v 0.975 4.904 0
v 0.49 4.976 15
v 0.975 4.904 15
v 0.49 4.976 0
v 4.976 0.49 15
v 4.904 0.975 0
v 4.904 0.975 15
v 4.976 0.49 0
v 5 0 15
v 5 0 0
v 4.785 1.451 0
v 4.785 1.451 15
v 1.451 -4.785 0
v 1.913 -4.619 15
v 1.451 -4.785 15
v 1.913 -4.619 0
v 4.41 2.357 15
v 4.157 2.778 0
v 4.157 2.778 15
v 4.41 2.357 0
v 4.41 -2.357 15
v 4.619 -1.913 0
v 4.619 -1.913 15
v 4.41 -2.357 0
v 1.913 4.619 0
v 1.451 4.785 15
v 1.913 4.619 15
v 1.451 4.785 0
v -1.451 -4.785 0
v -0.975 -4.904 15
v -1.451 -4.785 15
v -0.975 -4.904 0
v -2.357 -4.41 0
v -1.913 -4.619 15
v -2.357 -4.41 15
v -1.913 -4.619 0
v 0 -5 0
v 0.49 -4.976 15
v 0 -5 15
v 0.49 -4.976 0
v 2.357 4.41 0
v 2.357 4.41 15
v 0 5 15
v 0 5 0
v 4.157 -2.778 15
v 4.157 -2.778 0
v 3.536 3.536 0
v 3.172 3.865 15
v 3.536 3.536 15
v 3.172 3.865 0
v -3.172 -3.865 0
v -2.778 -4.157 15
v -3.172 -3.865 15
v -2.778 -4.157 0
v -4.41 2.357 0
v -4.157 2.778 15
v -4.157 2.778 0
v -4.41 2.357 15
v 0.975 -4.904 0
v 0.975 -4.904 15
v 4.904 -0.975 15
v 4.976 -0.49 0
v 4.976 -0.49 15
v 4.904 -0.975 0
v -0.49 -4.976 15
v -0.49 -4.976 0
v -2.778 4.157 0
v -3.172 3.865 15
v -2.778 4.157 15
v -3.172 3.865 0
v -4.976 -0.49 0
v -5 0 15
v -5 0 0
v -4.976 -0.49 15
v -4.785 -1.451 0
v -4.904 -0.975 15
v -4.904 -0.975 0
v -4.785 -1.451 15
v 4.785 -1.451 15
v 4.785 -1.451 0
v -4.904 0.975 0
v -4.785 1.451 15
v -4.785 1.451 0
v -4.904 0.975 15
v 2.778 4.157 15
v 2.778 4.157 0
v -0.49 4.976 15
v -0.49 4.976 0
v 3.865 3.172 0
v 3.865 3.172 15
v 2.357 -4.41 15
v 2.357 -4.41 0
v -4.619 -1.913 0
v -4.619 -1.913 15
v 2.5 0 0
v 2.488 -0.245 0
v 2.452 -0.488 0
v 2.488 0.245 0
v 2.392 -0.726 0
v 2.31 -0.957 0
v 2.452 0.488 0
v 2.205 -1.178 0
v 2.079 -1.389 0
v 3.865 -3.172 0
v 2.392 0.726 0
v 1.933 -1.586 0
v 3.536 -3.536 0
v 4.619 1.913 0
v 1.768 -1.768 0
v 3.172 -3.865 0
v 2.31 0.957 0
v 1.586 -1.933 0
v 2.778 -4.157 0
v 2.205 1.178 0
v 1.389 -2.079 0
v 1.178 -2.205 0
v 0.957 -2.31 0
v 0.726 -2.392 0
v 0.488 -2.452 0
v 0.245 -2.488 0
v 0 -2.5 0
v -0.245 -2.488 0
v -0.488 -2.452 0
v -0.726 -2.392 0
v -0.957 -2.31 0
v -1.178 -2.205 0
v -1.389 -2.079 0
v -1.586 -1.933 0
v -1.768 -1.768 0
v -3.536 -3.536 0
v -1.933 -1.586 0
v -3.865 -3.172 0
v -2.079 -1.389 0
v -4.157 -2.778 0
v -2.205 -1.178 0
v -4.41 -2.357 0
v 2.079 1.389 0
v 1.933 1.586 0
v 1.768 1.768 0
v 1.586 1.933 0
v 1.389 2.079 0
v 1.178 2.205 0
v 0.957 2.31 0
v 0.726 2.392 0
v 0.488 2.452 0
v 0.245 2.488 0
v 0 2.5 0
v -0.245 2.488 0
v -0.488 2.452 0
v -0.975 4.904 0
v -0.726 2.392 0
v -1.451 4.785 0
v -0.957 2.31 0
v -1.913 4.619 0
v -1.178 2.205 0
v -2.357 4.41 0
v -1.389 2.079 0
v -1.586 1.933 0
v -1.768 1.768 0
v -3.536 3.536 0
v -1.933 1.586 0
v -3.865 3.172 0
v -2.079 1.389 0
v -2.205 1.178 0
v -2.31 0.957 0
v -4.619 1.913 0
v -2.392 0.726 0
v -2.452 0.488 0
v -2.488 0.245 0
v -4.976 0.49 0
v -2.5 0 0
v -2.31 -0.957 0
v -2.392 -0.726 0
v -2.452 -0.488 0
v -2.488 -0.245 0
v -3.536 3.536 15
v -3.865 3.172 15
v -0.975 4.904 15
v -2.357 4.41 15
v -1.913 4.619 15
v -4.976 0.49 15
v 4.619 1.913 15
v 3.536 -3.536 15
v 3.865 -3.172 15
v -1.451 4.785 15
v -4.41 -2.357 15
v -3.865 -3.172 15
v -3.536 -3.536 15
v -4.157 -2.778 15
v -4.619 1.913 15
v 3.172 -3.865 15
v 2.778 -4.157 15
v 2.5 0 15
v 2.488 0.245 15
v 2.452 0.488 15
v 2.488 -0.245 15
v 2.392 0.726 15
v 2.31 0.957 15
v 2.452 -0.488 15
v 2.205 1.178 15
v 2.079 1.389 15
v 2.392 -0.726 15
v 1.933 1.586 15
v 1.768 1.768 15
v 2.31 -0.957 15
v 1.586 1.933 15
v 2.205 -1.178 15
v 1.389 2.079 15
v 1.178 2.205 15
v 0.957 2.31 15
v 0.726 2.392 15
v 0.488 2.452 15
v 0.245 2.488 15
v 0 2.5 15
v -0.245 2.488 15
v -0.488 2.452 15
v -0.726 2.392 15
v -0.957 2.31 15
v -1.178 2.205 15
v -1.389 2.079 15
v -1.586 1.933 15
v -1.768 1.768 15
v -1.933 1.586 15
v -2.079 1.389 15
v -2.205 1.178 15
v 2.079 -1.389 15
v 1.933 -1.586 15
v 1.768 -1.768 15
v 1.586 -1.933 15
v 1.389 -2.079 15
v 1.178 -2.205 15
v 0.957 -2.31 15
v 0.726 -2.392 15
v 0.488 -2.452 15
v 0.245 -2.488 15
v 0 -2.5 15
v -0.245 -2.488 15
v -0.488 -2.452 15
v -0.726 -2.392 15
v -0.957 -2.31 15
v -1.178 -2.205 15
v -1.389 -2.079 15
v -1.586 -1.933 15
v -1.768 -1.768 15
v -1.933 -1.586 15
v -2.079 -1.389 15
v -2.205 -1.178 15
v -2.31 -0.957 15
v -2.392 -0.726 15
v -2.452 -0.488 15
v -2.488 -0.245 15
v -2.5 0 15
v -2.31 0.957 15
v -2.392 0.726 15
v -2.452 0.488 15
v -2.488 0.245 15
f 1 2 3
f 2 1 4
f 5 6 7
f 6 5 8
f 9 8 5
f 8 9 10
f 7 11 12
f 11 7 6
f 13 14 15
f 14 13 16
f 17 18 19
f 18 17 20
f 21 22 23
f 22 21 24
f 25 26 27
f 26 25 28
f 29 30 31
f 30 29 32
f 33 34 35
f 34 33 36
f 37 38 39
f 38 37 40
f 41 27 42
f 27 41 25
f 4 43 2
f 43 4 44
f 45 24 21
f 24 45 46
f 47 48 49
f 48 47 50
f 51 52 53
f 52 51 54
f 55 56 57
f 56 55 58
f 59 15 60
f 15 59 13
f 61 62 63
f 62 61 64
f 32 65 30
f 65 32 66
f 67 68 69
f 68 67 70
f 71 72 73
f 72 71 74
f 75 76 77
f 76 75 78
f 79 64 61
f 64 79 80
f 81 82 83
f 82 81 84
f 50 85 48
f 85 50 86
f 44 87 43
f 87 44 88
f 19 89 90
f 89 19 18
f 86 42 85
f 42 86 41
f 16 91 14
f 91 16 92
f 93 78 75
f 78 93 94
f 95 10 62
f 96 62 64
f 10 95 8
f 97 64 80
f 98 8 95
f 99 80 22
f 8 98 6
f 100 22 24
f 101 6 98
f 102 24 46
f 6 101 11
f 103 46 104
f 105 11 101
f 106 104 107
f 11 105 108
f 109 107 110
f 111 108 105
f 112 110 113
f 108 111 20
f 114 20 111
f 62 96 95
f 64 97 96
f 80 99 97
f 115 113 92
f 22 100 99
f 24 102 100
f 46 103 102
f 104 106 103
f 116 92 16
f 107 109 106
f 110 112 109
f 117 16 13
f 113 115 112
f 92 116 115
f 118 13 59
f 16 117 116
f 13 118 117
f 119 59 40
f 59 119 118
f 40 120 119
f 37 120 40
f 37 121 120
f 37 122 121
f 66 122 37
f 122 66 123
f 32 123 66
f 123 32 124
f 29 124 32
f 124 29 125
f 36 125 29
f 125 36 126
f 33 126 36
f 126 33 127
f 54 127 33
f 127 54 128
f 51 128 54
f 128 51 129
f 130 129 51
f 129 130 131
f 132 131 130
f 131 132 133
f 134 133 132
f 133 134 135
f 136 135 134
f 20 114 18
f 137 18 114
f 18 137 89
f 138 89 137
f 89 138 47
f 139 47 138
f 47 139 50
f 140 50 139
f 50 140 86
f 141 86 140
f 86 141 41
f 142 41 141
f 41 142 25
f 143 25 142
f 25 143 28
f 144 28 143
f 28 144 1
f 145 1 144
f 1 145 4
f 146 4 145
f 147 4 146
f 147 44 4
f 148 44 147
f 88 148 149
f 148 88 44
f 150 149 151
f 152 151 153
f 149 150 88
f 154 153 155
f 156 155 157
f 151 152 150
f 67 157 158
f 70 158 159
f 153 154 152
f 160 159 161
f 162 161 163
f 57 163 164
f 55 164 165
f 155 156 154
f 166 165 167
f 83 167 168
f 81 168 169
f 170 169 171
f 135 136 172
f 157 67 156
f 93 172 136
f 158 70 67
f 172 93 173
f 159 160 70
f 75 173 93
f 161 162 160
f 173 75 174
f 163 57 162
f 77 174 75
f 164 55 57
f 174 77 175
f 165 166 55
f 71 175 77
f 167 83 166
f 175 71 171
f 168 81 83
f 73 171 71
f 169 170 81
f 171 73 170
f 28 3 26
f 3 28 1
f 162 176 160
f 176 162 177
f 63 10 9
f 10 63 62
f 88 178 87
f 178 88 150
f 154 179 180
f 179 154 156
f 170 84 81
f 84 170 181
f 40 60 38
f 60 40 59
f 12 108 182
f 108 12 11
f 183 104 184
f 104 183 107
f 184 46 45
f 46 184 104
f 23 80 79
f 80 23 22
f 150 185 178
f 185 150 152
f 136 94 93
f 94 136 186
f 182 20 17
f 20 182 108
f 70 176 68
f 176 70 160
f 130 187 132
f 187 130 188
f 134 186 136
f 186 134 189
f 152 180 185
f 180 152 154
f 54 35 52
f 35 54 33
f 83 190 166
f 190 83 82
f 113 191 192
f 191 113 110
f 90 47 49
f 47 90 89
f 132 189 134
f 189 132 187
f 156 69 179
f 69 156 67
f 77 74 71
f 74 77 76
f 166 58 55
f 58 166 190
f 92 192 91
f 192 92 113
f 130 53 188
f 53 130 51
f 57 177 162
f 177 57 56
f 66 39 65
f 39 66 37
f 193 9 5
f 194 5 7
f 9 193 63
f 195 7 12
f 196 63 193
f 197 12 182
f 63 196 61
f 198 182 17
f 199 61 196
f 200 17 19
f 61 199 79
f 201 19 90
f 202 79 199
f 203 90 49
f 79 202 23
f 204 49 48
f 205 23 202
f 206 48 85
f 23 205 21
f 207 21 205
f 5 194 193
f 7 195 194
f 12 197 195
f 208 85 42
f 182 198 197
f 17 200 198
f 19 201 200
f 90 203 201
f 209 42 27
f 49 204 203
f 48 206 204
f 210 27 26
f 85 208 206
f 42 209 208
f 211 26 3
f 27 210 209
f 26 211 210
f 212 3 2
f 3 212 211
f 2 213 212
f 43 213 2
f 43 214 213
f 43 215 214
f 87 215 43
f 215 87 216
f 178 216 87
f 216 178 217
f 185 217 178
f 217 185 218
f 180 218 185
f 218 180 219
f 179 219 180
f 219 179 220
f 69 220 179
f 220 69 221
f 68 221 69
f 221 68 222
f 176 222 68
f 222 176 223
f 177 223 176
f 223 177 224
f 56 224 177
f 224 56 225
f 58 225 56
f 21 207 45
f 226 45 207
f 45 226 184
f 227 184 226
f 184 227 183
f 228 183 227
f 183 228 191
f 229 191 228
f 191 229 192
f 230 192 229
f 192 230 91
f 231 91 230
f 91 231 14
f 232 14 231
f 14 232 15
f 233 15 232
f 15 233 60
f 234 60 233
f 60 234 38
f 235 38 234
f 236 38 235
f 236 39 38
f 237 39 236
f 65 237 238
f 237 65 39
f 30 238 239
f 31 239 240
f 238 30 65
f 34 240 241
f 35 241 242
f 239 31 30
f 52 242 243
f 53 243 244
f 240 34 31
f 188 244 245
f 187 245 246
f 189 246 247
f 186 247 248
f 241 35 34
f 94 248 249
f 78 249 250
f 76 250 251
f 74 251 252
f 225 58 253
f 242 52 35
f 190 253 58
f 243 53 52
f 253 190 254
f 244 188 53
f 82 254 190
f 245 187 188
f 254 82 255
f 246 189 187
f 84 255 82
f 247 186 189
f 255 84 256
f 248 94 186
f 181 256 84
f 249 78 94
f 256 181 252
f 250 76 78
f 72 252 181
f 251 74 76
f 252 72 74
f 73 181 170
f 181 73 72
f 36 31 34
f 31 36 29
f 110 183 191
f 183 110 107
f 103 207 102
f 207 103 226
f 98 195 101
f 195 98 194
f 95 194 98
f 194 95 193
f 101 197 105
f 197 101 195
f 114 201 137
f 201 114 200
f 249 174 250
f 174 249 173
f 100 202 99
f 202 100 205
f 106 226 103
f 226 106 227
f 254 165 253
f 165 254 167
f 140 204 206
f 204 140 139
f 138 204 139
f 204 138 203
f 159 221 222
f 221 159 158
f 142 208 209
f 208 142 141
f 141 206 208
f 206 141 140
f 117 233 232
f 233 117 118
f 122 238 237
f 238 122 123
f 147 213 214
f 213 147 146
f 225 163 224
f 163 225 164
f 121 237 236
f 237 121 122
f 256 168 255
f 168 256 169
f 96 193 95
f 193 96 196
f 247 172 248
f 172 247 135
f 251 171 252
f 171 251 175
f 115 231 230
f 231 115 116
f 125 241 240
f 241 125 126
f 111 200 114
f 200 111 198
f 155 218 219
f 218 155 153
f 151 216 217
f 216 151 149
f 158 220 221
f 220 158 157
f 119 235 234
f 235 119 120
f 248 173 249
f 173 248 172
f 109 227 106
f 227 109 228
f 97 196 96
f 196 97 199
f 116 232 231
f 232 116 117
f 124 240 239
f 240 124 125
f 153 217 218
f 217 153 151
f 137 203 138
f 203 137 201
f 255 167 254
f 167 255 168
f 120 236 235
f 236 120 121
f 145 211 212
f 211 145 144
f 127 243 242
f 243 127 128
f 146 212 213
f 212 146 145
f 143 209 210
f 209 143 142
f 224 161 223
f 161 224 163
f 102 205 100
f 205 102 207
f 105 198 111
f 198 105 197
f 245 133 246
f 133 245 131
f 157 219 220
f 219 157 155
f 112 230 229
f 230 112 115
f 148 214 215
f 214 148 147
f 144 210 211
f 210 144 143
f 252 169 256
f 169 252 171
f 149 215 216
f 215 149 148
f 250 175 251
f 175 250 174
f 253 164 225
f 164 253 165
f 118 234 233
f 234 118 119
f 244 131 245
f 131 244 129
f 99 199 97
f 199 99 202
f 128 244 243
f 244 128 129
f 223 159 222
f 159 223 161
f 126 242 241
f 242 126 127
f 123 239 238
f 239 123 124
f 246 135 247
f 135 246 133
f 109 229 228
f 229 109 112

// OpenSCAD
module linear_bearing() {
    difference() {
        // Outer cylinder
        cylinder(h=15.0, d=10.0, $fn=64);
        // Inner bore
        translate([0, 0, -1]) // Ensure the bore goes through completely
            cylinder(h=17.0, d=5.0, $fn=64);
    }
}

linear_bearing();
